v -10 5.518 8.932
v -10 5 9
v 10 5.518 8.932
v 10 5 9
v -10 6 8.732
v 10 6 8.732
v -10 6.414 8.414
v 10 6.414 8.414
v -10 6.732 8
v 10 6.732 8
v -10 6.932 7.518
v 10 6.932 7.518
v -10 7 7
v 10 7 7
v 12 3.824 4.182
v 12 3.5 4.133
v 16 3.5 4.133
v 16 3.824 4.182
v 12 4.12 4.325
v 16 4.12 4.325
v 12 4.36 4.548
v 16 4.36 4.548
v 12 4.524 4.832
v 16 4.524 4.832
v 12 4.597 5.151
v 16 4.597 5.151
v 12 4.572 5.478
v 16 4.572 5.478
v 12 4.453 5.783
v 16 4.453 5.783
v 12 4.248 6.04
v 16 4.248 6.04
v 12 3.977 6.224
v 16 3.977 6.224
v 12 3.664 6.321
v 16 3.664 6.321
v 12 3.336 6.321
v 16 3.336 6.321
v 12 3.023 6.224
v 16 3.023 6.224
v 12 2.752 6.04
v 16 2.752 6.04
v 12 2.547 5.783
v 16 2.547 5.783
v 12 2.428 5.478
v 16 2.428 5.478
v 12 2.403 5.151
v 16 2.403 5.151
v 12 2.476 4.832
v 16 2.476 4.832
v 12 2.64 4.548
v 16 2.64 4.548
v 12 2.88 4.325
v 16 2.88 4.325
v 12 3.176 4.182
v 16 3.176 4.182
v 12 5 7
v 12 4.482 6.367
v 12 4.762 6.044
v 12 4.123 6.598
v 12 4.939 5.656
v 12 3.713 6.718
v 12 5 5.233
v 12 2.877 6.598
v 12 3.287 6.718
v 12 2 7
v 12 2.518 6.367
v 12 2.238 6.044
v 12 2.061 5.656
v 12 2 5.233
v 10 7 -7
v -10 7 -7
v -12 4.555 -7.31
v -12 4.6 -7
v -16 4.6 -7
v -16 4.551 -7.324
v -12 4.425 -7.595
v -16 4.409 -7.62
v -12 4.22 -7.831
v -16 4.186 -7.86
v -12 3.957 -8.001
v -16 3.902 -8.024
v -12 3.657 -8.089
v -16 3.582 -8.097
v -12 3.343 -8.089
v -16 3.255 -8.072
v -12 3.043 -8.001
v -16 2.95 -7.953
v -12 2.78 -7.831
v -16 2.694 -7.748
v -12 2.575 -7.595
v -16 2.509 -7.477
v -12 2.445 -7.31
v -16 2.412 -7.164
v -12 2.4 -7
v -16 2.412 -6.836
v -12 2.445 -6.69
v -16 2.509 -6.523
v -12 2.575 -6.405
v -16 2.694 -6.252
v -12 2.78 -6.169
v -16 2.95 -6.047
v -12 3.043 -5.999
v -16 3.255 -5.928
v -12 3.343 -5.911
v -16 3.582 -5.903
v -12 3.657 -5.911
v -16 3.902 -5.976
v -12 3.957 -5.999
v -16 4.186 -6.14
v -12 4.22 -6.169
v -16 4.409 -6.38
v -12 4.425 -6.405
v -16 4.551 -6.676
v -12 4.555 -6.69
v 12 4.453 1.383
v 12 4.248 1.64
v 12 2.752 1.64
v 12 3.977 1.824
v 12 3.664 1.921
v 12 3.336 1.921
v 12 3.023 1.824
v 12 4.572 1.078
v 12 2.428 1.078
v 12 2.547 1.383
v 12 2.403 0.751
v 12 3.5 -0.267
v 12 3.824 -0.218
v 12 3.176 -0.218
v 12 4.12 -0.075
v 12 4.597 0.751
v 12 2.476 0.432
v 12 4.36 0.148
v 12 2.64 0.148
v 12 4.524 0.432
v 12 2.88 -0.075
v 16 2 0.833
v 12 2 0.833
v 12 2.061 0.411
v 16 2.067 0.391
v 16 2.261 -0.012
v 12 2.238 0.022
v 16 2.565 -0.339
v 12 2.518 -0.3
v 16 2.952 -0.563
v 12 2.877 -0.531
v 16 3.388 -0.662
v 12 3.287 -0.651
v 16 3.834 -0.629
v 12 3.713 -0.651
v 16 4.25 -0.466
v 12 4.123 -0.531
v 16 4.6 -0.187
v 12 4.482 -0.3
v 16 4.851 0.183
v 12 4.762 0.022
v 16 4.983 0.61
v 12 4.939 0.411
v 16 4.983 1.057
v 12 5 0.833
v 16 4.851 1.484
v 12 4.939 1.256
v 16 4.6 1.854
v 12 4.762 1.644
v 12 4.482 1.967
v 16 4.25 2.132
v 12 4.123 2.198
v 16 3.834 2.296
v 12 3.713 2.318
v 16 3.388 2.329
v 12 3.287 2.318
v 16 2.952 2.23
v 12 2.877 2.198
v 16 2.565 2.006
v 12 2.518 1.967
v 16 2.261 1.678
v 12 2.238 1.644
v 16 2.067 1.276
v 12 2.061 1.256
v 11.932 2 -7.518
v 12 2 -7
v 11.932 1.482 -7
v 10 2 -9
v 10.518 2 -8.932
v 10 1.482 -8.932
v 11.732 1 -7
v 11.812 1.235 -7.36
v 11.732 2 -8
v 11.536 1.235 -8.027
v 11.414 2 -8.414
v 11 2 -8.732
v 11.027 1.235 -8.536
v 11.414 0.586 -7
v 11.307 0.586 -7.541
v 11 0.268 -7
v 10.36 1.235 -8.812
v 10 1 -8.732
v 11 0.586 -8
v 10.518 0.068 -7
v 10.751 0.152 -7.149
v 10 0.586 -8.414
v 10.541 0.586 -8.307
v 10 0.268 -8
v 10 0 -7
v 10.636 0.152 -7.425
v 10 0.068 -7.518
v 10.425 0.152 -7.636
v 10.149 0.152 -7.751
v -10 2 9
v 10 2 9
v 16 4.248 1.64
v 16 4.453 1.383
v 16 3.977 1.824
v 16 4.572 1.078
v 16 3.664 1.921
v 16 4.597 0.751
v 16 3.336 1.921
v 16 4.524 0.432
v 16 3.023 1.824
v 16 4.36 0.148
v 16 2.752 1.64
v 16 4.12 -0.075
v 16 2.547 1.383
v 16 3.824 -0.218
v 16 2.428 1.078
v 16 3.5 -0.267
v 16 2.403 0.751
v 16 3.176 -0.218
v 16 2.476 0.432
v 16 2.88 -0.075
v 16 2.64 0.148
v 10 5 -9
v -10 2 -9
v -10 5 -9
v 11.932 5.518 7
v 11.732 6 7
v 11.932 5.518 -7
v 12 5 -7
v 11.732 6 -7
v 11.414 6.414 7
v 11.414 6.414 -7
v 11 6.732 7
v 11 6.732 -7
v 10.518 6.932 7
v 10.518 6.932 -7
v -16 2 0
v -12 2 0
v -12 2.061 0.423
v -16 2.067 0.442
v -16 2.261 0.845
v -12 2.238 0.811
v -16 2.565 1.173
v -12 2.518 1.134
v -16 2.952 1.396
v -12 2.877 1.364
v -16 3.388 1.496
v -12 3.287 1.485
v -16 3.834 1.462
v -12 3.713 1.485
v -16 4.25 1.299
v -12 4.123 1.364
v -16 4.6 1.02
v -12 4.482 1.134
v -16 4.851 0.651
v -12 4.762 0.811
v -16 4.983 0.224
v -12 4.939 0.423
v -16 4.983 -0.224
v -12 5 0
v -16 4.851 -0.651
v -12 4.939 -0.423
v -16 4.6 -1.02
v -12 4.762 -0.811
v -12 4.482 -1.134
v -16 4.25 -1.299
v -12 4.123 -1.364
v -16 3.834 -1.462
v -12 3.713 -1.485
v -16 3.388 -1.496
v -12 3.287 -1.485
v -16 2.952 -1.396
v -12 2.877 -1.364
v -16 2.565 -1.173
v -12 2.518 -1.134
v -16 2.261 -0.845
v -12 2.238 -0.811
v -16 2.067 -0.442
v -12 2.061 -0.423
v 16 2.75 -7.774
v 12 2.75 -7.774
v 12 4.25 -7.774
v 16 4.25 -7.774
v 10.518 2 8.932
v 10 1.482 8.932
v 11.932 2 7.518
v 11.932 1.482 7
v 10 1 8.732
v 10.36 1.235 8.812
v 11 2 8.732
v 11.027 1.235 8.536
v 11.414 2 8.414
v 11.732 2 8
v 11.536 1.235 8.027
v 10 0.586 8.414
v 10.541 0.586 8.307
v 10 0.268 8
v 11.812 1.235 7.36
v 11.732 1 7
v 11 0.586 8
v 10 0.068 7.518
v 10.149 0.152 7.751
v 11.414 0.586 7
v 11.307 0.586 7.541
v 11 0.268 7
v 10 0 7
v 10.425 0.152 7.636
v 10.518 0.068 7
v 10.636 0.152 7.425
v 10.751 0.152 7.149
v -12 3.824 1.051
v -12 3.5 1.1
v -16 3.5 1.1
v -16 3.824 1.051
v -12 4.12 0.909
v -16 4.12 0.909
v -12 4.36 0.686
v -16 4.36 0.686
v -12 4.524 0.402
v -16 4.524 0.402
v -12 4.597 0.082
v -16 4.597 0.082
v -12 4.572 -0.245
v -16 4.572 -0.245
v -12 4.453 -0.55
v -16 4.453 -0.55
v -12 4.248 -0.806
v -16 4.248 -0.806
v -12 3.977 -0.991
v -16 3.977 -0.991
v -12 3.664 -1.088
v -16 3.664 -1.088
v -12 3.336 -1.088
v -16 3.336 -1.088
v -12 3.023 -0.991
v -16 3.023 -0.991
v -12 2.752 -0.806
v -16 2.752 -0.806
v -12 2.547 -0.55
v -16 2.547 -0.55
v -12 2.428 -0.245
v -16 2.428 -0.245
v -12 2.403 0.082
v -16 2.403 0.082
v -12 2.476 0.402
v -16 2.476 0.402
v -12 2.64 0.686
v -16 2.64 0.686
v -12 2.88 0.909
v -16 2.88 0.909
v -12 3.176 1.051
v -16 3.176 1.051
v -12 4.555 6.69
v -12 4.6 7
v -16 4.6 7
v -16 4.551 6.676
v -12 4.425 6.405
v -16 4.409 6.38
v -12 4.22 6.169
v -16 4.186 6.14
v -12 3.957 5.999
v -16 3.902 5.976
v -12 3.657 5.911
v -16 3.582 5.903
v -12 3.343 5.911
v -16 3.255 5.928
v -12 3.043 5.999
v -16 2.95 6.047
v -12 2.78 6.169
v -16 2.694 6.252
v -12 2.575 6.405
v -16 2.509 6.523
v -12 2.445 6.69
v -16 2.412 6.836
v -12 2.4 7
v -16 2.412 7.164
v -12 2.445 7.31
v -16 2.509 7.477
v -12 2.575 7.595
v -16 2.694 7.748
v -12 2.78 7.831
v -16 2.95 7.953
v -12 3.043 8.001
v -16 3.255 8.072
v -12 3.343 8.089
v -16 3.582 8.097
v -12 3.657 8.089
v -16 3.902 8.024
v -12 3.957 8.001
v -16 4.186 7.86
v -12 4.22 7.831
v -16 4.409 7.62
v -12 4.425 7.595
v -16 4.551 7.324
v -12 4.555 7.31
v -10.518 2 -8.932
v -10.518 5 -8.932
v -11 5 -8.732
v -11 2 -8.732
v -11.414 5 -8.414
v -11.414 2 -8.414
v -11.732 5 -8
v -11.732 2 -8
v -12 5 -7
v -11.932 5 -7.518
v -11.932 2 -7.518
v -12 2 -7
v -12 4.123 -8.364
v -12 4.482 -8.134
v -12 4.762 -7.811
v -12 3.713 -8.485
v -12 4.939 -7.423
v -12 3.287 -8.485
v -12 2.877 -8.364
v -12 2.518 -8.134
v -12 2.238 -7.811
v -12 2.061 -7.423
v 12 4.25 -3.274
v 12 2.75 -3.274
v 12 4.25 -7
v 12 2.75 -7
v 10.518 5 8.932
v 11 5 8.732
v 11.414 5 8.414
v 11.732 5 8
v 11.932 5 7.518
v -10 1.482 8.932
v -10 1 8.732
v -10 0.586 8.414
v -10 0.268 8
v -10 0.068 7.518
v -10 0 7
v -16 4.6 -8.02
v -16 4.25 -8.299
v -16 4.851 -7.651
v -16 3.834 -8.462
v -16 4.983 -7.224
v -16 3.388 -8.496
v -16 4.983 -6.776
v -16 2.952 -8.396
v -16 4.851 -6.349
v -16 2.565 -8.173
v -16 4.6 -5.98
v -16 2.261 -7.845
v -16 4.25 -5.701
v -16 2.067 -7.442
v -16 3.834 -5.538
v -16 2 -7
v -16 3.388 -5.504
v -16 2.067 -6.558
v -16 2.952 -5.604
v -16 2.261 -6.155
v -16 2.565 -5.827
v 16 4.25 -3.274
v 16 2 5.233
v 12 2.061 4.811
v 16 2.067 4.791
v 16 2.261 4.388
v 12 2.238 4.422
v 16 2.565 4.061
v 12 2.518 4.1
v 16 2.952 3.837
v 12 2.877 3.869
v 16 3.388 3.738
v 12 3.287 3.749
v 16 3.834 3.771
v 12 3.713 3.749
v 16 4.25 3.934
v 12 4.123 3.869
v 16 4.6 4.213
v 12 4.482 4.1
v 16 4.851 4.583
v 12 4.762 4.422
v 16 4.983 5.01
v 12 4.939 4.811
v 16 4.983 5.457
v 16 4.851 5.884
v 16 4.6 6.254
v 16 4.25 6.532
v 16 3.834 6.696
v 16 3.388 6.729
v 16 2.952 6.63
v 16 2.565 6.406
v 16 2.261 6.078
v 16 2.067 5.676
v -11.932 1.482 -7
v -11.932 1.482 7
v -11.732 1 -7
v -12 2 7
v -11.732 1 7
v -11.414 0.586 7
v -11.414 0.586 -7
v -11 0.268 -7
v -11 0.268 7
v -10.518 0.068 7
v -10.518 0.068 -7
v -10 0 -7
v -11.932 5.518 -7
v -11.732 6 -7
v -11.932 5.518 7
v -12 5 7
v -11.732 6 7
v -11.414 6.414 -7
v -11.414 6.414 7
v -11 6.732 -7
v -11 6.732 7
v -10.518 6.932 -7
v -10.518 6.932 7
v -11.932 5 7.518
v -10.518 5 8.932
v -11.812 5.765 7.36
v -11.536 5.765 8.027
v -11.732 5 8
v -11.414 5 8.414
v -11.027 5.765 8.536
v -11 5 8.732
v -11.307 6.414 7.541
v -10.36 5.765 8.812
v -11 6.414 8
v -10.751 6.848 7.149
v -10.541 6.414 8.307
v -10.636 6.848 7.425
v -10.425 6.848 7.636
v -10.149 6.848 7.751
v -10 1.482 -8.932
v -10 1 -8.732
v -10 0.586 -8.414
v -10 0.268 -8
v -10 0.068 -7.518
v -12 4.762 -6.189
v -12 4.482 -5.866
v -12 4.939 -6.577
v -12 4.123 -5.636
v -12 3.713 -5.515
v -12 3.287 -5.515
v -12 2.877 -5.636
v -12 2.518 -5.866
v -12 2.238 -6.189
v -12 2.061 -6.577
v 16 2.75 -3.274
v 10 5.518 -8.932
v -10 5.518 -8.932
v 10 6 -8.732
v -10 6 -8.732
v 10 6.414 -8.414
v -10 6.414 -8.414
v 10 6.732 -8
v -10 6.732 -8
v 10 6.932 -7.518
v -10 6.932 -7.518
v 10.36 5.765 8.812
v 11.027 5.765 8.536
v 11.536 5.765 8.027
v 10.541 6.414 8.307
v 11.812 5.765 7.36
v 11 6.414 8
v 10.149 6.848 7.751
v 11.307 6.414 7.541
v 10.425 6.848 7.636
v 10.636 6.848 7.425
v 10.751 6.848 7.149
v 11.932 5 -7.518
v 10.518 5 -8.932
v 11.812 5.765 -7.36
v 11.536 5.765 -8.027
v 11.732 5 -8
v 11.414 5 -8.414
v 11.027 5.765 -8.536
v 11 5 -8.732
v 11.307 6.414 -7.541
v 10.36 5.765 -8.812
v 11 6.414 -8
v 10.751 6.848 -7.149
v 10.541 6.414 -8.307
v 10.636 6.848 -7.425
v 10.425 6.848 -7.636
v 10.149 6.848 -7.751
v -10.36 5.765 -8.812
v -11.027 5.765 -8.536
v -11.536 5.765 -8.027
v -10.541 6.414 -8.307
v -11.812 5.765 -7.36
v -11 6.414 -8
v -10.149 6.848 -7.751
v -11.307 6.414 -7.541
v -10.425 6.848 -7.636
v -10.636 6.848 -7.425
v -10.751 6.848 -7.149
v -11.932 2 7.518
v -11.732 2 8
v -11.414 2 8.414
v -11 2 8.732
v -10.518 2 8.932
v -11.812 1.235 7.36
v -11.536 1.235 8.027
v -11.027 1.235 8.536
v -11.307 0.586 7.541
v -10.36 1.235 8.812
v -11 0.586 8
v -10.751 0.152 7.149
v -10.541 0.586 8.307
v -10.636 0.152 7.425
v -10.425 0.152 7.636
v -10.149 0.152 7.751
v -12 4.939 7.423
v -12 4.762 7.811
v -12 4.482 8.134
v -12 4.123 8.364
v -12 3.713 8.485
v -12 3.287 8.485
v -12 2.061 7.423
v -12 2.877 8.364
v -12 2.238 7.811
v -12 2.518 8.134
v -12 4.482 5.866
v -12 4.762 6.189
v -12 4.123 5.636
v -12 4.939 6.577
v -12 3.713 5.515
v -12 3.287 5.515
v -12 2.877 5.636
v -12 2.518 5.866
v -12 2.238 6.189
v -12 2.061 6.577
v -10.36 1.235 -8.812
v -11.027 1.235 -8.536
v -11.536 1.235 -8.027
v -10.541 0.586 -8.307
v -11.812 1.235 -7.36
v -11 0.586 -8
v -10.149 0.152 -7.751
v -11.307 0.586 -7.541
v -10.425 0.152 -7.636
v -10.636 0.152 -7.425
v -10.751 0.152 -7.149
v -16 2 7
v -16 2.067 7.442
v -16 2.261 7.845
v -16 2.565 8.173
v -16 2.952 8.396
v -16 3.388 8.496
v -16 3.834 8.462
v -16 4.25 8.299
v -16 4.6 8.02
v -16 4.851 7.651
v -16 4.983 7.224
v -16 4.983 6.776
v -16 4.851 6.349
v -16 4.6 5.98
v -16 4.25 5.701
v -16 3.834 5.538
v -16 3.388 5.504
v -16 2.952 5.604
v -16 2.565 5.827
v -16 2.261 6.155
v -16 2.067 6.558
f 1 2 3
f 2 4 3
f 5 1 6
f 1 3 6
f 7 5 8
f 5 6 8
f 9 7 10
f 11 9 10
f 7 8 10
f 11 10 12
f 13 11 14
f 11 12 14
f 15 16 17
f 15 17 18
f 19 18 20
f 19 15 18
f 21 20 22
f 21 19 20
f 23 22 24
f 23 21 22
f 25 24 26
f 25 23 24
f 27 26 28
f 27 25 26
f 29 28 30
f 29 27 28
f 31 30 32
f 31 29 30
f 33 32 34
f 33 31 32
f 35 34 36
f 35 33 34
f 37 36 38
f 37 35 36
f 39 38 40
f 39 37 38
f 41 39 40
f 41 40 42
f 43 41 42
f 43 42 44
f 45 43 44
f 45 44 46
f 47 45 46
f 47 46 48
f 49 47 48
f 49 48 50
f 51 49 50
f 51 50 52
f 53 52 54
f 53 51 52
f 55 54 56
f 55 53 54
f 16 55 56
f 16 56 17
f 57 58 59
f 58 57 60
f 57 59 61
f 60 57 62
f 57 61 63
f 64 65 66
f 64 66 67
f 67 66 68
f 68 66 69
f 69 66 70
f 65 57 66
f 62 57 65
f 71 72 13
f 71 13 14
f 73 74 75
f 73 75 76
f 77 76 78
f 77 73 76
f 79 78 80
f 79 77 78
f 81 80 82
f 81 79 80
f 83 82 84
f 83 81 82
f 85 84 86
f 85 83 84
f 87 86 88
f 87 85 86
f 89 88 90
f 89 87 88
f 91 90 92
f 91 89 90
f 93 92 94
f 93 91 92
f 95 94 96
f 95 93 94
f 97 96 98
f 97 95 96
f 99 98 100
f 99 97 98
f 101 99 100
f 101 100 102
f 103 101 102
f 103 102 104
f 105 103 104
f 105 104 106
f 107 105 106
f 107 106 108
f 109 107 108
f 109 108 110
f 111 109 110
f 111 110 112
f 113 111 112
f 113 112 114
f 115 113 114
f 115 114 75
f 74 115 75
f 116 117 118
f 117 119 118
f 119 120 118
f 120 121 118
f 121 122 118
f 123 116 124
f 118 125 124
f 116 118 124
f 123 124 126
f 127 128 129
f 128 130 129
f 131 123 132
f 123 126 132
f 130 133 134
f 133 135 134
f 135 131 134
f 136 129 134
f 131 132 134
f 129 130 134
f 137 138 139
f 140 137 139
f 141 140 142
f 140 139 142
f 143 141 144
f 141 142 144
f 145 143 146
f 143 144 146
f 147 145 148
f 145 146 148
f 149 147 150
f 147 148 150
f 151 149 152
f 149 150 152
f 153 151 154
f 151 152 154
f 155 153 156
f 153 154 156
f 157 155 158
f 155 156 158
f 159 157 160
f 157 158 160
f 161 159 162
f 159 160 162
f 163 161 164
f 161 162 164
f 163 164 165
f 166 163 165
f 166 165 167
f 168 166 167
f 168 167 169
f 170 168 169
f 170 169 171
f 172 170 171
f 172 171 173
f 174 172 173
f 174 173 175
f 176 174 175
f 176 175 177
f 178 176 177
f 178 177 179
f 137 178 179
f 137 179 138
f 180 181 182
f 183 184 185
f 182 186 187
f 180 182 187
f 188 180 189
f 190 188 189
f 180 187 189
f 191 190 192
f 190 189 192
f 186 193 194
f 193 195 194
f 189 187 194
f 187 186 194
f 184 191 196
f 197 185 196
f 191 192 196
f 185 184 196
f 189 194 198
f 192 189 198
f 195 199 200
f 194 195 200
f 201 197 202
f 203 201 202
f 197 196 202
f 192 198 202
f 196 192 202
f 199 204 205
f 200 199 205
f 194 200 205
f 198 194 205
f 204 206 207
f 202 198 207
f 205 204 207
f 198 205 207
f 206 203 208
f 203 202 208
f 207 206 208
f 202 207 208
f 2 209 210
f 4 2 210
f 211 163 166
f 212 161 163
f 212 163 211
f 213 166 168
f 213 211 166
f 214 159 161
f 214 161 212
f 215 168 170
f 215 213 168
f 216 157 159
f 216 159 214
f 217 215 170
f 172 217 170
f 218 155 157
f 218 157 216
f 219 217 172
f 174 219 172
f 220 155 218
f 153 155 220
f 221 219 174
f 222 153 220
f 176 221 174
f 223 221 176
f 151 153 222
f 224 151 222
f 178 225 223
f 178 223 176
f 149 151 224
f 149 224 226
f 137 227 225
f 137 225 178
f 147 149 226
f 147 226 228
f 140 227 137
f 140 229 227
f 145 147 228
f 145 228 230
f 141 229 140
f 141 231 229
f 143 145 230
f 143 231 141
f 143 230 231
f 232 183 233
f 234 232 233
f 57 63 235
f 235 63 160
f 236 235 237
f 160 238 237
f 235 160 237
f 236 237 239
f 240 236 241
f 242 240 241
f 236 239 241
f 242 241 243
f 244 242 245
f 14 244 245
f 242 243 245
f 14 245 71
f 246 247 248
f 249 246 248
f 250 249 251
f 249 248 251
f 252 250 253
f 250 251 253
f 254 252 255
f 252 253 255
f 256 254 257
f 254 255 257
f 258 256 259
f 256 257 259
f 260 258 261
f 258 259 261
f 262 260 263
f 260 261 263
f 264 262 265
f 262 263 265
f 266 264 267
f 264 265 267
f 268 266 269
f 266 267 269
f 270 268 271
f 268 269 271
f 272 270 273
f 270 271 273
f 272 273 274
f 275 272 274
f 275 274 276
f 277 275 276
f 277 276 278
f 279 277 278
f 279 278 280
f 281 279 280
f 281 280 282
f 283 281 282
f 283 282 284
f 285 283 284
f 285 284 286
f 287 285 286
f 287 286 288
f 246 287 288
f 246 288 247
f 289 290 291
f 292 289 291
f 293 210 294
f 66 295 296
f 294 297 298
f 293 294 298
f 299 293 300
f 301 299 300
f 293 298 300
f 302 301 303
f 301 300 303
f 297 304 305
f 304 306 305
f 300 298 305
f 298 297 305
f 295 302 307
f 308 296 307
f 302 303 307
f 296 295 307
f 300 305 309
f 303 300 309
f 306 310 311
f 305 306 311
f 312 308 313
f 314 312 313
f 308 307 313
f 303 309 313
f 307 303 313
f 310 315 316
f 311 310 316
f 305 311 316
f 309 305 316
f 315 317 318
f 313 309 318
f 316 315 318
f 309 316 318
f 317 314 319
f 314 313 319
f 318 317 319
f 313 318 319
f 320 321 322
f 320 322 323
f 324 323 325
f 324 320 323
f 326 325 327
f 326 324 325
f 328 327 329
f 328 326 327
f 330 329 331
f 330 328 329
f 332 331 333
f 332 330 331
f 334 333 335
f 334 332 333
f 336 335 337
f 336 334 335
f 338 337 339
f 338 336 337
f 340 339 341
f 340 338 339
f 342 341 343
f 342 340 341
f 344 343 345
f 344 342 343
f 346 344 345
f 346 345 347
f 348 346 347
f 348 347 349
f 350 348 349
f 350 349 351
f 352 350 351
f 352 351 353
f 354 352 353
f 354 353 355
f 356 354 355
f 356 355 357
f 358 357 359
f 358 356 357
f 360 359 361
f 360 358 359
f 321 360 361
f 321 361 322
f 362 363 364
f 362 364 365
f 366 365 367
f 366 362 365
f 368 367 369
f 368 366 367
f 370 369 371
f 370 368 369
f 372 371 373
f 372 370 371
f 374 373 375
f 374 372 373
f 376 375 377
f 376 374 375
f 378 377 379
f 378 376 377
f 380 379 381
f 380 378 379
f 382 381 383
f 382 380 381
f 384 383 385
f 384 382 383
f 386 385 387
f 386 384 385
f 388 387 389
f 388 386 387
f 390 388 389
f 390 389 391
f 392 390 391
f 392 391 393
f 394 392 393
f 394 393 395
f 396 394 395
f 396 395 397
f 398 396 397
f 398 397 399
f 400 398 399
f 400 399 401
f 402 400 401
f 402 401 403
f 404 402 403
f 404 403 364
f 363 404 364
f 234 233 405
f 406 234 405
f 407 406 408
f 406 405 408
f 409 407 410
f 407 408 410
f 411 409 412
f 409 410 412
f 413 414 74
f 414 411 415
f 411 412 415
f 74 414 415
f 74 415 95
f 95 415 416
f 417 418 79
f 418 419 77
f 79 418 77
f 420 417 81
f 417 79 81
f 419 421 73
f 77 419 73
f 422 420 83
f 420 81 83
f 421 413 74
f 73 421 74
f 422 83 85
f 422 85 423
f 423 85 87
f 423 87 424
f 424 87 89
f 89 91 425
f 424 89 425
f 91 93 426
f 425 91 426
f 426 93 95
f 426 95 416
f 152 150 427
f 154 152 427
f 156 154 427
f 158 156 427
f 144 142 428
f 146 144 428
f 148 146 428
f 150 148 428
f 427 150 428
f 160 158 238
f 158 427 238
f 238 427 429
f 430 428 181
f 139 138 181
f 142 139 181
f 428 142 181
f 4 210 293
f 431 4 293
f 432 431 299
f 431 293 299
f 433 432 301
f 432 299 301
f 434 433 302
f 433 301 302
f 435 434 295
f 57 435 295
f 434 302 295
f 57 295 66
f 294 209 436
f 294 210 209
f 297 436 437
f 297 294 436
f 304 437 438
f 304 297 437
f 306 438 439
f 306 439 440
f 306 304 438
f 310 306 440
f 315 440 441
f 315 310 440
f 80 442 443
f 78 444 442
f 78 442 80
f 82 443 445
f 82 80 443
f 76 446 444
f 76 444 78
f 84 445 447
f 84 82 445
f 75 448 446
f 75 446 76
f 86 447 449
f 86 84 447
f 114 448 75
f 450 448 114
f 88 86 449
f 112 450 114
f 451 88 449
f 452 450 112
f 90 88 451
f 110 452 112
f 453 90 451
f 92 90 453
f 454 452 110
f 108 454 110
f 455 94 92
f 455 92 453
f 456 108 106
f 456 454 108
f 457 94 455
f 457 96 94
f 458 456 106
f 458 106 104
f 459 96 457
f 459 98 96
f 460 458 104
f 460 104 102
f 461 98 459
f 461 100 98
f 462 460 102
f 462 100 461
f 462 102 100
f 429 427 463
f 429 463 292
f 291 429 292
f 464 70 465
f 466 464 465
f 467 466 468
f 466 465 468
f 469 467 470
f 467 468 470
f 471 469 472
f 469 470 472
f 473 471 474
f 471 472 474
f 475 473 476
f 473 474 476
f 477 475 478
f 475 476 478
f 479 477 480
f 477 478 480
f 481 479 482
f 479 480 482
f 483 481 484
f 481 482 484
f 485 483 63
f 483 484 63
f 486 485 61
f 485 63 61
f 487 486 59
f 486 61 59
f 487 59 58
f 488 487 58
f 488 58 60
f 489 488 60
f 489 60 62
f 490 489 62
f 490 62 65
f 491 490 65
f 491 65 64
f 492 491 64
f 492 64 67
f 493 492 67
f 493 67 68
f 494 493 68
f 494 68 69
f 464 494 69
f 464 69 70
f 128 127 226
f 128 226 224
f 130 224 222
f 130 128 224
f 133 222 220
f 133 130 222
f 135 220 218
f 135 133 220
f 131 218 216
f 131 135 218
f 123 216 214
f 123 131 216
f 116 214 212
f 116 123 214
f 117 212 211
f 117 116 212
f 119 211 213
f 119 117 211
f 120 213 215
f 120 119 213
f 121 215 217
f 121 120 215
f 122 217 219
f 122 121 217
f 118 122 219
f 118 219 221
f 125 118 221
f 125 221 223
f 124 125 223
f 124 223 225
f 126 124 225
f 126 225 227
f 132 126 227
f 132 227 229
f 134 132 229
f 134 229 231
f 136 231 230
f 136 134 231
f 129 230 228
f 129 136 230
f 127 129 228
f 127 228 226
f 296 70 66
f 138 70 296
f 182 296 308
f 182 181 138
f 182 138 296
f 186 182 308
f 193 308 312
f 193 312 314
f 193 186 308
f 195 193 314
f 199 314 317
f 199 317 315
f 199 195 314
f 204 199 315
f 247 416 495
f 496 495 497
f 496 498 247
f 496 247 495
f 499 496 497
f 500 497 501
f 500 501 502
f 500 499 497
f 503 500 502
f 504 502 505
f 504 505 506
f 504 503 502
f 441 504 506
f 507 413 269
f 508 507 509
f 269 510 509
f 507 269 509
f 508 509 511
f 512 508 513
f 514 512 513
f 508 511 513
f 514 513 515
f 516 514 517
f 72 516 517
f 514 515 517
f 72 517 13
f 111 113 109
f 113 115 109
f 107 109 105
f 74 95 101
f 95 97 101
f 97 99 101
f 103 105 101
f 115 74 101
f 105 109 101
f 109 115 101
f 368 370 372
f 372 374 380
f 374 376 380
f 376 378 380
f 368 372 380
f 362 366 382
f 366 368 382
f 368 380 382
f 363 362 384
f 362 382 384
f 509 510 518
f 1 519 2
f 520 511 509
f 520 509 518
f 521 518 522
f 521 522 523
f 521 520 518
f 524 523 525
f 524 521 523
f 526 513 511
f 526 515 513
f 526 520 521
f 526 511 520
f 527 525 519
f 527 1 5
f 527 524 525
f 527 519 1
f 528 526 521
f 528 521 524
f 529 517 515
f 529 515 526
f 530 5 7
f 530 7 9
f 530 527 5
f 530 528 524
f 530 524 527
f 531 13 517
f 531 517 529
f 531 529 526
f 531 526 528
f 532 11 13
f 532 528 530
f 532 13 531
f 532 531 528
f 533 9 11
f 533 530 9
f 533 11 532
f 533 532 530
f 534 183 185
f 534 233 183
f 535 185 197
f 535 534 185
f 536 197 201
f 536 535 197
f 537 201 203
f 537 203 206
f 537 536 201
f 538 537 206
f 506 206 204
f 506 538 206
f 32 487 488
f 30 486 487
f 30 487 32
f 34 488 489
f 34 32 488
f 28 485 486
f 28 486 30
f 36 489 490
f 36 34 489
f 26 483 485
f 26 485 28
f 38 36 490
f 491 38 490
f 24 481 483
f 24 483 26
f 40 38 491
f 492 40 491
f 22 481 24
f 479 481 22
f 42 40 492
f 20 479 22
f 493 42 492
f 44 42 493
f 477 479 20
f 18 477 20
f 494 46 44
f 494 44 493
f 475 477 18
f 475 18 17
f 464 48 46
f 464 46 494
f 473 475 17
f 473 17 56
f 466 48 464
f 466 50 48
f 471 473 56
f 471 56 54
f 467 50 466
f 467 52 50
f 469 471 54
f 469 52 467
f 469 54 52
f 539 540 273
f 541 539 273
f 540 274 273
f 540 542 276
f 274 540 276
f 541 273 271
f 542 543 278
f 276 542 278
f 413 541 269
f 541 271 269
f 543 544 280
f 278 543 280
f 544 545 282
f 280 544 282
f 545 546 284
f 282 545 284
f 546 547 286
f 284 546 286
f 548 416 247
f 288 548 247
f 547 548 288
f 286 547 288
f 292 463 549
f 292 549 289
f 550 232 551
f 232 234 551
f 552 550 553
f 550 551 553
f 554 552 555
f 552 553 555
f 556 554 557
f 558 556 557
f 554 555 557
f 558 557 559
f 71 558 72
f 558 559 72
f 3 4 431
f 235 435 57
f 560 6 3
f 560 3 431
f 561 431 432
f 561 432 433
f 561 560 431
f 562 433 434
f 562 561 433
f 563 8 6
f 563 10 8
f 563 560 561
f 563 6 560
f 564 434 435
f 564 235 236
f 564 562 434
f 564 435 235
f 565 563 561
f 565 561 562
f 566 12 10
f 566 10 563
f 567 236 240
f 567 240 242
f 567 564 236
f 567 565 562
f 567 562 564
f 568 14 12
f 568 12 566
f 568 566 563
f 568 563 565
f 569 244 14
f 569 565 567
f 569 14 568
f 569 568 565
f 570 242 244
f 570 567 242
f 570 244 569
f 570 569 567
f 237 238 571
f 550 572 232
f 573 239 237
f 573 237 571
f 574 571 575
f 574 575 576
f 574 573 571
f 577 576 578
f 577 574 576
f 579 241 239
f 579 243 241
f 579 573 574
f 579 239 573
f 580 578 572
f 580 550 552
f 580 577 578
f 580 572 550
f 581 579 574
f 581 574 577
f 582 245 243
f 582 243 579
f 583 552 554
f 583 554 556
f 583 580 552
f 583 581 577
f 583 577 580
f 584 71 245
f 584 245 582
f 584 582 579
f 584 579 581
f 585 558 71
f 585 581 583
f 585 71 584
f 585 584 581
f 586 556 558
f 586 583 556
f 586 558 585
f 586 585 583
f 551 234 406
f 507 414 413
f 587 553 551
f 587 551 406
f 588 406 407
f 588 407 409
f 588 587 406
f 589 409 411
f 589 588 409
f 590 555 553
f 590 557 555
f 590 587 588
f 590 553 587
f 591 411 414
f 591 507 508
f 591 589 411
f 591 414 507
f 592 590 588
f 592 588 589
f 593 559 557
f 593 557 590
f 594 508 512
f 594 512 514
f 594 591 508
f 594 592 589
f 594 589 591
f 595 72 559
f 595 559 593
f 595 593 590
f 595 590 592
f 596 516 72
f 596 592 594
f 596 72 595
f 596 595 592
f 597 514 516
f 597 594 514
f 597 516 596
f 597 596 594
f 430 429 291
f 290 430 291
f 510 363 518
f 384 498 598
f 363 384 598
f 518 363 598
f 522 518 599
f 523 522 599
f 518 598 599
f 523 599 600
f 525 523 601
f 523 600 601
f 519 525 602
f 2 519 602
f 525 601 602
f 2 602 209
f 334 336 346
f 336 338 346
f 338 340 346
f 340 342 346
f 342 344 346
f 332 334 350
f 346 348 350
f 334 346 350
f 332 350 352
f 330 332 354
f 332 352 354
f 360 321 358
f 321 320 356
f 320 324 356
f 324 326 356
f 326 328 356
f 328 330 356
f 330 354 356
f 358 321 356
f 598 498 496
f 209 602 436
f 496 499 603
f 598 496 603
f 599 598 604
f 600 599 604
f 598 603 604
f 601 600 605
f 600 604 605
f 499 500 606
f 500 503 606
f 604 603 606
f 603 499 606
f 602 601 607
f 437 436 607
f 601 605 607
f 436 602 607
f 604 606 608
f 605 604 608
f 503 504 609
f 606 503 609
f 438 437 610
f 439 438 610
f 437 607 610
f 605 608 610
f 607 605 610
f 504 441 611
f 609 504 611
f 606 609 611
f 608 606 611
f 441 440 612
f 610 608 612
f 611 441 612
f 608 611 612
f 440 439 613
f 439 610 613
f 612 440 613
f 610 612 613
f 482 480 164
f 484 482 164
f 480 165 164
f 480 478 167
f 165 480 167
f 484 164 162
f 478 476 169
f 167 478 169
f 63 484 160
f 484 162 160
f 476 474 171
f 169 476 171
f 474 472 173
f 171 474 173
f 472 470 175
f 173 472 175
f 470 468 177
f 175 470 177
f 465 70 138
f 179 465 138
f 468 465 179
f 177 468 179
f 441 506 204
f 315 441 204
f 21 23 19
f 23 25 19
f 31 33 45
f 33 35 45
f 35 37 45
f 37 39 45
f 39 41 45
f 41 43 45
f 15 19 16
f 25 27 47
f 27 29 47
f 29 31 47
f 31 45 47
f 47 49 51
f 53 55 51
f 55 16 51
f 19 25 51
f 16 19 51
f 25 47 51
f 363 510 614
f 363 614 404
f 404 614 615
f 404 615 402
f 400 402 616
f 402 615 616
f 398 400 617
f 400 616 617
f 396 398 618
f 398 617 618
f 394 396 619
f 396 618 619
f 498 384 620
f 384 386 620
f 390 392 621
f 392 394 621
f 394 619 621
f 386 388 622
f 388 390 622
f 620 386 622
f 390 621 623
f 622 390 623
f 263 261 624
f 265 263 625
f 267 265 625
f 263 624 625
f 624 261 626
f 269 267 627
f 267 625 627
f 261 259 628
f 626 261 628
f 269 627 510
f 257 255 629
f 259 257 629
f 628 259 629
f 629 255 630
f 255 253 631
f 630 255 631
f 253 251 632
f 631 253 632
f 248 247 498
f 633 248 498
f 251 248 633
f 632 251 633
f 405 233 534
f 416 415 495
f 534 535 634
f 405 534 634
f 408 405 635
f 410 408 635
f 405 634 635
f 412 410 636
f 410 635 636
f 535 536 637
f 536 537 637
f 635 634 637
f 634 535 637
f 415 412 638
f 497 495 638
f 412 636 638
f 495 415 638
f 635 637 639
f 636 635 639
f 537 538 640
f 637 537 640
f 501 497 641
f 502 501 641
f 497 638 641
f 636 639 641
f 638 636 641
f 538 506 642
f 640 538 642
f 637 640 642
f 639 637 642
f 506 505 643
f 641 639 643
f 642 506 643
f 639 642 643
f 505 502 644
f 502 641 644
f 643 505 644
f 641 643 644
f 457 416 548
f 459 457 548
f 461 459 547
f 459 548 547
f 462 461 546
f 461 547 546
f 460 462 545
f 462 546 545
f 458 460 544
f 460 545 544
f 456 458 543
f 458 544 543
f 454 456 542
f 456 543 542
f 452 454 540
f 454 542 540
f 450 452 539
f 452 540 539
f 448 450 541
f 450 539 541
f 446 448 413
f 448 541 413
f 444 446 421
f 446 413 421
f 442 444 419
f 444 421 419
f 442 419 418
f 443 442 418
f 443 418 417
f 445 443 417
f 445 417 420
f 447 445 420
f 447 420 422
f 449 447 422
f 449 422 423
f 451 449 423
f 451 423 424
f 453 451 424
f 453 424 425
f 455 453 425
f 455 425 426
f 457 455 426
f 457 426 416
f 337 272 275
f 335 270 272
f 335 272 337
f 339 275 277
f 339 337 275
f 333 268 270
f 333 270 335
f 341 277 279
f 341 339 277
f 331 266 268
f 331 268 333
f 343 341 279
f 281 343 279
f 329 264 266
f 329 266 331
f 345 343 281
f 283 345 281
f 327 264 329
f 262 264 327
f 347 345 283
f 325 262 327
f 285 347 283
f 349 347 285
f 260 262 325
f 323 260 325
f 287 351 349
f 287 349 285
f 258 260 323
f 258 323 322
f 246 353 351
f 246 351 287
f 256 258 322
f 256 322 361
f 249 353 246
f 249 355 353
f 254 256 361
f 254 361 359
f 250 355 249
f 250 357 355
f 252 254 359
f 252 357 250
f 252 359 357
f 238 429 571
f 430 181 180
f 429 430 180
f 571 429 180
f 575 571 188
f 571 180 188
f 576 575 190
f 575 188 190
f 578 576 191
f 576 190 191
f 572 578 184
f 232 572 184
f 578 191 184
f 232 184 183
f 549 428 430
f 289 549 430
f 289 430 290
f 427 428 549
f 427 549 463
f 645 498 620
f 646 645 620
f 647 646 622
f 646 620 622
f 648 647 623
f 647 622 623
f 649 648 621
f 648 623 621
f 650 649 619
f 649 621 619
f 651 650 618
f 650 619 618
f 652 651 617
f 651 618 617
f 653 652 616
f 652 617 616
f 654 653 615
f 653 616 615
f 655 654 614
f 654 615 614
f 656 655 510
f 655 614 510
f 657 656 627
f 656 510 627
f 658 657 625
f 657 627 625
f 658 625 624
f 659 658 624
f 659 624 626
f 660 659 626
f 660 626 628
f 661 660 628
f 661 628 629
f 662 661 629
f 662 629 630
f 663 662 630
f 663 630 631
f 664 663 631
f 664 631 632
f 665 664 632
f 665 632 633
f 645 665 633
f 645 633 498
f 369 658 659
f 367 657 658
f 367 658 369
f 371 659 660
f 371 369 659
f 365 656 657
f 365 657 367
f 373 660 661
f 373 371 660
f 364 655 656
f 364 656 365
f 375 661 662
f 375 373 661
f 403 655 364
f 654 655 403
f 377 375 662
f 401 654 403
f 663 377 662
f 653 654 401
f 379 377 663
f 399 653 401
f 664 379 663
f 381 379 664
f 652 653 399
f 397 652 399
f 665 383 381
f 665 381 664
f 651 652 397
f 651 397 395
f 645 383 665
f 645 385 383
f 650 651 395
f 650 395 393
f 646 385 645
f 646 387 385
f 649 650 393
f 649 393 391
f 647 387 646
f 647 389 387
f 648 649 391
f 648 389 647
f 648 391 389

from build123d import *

# Parameters (mm, degrees)
BOSS_EXTRUDE1_DEPTH = 7
FILLET1_R           = 2
SKETCH2_R           = 1.5
SKETCH2_R_2         = 1.1
BOSS_EXTRUDE2_DEPTH = 4
SKETCH3_R           = 1.5
SKETCH3_R_2         = 1.1
SKETCH3_W           = 4.5
SKETCH3_H           = 1.5
BOSS_EXTRUDE3_DEPTH = 4


with BuildPart() as part:
    # Sketch1 → Boss-Extrude1 (new body)
    with BuildSketch(Plane(origin=(0, 0, 0), x_dir=(1, 0, 0), z_dir=(0, 1, 0))):
        with BuildLine():
            Line((10, 9), (-10, 9))
            ThreePointArc((-10, 9), (-11.414213562, 8.414213562), (-12, 7))
            Line((-12, 7), (-12, -7))
            ThreePointArc((-12, -7), (-11.414213562, -8.414213562), (-10, -9))
            Line((-10, -9), (10, -9))
            ThreePointArc((10, -9), (11.414213562, -8.414213562), (12, -7))
            Line((12, -7), (12, 7))
            ThreePointArc((12, 7), (11.414213562, 8.414213562), (10, 9))
        make_face()
    extrude(amount=BOSS_EXTRUDE1_DEPTH)

    # Fillet1
    fillet1_edges = [part.edges().sort_by_distance(p)[0] for p in [
        (12, 0, 0),
        (11.414213562, 0, 8.414213562),
        (0, 0, 9),
        (-11.414213562, 0, 8.414213562),
        (11.414213562, 7, 8.414213562),
        (12, 7, 0),
        (11.414213562, 7, -8.414213562),
        (0, 7, -9),
        (-11.414213562, 7, -8.414213562),
        (-12, 7, 0),
        (-11.414213562, 7, 8.414213562),
        (-12, 0, 0),
        (0, 7, 9),
        (-11.414213562, 0, -8.414213562),
        (0, 0, -9),
        (11.414213562, 0, -8.414213562),
    ]]
    fillet(fillet1_edges, radius=FILLET1_R)

    # Sketch2 → Boss-Extrude2 (add)
    # profile 1 of 3: a face of its own
    with BuildSketch(Plane.ZY.offset(12)):
        with Locations(Location((0, 3.5, 0), (0, 0, 270))):
            Circle(SKETCH2_R)
        with Locations((0, 3.5)):
            Circle(SKETCH2_R_2, mode=Mode.SUBTRACT)
    # profile 2 of 3: a face of its own
    with BuildSketch(Plane.ZY.offset(12)):
        with Locations(Location((7, 3.5, 0), (0, 0, 270))):
            Circle(SKETCH2_R)
        with Locations(Location((7, 3.5, 0), (0, 0, 90))):
            Circle(SKETCH2_R_2, mode=Mode.SUBTRACT)
    # profile 3 of 3: a face of its own
    with BuildSketch(Plane.ZY.offset(12)):
        with Locations(Location((-7, 3.5, 0), (0, 0, 270))):
            Circle(SKETCH2_R)
        with Locations(Location((-7, 3.5, 0), (0, 0, 90))):
            Circle(SKETCH2_R_2, mode=Mode.SUBTRACT)
    extrude(amount=BOSS_EXTRUDE2_DEPTH)

    # Sketch3 → Boss-Extrude3 (add)
    # profile 1 of 3: a face of its own
    with BuildSketch(Plane(origin=(12, 0, 0), x_dir=(0, 0, -1), z_dir=(1, 0, 0))):
        with Locations(Location((-5.233431742, 3.5, 0), (0, 0, 270))):
            Circle(SKETCH3_R)
        with Locations((-5.233431742, 3.5)):
            Circle(SKETCH3_R_2, mode=Mode.SUBTRACT)
    # profile 2 of 3: a face of its own
    with BuildSketch(Plane(origin=(12, 0, 0), x_dir=(0, 0, -1), z_dir=(1, 0, 0))):
        with Locations(Location((-0.833431742, 3.5, 0), (0, 0, 270))):
            Circle(SKETCH3_R)
        with Locations((-0.833431742, 3.5)):
            Circle(SKETCH3_R_2, mode=Mode.SUBTRACT)
    # profile 3 of 3: a face of its own
    with BuildSketch(Plane(origin=(12, 0, 0), x_dir=(0, 0, -1), z_dir=(1, 0, 0))):
        with Locations((5.52417795, 3.5)):
            Rectangle(SKETCH3_W, SKETCH3_H)
    extrude(amount=BOSS_EXTRUDE3_DEPTH)


solid = part.part
